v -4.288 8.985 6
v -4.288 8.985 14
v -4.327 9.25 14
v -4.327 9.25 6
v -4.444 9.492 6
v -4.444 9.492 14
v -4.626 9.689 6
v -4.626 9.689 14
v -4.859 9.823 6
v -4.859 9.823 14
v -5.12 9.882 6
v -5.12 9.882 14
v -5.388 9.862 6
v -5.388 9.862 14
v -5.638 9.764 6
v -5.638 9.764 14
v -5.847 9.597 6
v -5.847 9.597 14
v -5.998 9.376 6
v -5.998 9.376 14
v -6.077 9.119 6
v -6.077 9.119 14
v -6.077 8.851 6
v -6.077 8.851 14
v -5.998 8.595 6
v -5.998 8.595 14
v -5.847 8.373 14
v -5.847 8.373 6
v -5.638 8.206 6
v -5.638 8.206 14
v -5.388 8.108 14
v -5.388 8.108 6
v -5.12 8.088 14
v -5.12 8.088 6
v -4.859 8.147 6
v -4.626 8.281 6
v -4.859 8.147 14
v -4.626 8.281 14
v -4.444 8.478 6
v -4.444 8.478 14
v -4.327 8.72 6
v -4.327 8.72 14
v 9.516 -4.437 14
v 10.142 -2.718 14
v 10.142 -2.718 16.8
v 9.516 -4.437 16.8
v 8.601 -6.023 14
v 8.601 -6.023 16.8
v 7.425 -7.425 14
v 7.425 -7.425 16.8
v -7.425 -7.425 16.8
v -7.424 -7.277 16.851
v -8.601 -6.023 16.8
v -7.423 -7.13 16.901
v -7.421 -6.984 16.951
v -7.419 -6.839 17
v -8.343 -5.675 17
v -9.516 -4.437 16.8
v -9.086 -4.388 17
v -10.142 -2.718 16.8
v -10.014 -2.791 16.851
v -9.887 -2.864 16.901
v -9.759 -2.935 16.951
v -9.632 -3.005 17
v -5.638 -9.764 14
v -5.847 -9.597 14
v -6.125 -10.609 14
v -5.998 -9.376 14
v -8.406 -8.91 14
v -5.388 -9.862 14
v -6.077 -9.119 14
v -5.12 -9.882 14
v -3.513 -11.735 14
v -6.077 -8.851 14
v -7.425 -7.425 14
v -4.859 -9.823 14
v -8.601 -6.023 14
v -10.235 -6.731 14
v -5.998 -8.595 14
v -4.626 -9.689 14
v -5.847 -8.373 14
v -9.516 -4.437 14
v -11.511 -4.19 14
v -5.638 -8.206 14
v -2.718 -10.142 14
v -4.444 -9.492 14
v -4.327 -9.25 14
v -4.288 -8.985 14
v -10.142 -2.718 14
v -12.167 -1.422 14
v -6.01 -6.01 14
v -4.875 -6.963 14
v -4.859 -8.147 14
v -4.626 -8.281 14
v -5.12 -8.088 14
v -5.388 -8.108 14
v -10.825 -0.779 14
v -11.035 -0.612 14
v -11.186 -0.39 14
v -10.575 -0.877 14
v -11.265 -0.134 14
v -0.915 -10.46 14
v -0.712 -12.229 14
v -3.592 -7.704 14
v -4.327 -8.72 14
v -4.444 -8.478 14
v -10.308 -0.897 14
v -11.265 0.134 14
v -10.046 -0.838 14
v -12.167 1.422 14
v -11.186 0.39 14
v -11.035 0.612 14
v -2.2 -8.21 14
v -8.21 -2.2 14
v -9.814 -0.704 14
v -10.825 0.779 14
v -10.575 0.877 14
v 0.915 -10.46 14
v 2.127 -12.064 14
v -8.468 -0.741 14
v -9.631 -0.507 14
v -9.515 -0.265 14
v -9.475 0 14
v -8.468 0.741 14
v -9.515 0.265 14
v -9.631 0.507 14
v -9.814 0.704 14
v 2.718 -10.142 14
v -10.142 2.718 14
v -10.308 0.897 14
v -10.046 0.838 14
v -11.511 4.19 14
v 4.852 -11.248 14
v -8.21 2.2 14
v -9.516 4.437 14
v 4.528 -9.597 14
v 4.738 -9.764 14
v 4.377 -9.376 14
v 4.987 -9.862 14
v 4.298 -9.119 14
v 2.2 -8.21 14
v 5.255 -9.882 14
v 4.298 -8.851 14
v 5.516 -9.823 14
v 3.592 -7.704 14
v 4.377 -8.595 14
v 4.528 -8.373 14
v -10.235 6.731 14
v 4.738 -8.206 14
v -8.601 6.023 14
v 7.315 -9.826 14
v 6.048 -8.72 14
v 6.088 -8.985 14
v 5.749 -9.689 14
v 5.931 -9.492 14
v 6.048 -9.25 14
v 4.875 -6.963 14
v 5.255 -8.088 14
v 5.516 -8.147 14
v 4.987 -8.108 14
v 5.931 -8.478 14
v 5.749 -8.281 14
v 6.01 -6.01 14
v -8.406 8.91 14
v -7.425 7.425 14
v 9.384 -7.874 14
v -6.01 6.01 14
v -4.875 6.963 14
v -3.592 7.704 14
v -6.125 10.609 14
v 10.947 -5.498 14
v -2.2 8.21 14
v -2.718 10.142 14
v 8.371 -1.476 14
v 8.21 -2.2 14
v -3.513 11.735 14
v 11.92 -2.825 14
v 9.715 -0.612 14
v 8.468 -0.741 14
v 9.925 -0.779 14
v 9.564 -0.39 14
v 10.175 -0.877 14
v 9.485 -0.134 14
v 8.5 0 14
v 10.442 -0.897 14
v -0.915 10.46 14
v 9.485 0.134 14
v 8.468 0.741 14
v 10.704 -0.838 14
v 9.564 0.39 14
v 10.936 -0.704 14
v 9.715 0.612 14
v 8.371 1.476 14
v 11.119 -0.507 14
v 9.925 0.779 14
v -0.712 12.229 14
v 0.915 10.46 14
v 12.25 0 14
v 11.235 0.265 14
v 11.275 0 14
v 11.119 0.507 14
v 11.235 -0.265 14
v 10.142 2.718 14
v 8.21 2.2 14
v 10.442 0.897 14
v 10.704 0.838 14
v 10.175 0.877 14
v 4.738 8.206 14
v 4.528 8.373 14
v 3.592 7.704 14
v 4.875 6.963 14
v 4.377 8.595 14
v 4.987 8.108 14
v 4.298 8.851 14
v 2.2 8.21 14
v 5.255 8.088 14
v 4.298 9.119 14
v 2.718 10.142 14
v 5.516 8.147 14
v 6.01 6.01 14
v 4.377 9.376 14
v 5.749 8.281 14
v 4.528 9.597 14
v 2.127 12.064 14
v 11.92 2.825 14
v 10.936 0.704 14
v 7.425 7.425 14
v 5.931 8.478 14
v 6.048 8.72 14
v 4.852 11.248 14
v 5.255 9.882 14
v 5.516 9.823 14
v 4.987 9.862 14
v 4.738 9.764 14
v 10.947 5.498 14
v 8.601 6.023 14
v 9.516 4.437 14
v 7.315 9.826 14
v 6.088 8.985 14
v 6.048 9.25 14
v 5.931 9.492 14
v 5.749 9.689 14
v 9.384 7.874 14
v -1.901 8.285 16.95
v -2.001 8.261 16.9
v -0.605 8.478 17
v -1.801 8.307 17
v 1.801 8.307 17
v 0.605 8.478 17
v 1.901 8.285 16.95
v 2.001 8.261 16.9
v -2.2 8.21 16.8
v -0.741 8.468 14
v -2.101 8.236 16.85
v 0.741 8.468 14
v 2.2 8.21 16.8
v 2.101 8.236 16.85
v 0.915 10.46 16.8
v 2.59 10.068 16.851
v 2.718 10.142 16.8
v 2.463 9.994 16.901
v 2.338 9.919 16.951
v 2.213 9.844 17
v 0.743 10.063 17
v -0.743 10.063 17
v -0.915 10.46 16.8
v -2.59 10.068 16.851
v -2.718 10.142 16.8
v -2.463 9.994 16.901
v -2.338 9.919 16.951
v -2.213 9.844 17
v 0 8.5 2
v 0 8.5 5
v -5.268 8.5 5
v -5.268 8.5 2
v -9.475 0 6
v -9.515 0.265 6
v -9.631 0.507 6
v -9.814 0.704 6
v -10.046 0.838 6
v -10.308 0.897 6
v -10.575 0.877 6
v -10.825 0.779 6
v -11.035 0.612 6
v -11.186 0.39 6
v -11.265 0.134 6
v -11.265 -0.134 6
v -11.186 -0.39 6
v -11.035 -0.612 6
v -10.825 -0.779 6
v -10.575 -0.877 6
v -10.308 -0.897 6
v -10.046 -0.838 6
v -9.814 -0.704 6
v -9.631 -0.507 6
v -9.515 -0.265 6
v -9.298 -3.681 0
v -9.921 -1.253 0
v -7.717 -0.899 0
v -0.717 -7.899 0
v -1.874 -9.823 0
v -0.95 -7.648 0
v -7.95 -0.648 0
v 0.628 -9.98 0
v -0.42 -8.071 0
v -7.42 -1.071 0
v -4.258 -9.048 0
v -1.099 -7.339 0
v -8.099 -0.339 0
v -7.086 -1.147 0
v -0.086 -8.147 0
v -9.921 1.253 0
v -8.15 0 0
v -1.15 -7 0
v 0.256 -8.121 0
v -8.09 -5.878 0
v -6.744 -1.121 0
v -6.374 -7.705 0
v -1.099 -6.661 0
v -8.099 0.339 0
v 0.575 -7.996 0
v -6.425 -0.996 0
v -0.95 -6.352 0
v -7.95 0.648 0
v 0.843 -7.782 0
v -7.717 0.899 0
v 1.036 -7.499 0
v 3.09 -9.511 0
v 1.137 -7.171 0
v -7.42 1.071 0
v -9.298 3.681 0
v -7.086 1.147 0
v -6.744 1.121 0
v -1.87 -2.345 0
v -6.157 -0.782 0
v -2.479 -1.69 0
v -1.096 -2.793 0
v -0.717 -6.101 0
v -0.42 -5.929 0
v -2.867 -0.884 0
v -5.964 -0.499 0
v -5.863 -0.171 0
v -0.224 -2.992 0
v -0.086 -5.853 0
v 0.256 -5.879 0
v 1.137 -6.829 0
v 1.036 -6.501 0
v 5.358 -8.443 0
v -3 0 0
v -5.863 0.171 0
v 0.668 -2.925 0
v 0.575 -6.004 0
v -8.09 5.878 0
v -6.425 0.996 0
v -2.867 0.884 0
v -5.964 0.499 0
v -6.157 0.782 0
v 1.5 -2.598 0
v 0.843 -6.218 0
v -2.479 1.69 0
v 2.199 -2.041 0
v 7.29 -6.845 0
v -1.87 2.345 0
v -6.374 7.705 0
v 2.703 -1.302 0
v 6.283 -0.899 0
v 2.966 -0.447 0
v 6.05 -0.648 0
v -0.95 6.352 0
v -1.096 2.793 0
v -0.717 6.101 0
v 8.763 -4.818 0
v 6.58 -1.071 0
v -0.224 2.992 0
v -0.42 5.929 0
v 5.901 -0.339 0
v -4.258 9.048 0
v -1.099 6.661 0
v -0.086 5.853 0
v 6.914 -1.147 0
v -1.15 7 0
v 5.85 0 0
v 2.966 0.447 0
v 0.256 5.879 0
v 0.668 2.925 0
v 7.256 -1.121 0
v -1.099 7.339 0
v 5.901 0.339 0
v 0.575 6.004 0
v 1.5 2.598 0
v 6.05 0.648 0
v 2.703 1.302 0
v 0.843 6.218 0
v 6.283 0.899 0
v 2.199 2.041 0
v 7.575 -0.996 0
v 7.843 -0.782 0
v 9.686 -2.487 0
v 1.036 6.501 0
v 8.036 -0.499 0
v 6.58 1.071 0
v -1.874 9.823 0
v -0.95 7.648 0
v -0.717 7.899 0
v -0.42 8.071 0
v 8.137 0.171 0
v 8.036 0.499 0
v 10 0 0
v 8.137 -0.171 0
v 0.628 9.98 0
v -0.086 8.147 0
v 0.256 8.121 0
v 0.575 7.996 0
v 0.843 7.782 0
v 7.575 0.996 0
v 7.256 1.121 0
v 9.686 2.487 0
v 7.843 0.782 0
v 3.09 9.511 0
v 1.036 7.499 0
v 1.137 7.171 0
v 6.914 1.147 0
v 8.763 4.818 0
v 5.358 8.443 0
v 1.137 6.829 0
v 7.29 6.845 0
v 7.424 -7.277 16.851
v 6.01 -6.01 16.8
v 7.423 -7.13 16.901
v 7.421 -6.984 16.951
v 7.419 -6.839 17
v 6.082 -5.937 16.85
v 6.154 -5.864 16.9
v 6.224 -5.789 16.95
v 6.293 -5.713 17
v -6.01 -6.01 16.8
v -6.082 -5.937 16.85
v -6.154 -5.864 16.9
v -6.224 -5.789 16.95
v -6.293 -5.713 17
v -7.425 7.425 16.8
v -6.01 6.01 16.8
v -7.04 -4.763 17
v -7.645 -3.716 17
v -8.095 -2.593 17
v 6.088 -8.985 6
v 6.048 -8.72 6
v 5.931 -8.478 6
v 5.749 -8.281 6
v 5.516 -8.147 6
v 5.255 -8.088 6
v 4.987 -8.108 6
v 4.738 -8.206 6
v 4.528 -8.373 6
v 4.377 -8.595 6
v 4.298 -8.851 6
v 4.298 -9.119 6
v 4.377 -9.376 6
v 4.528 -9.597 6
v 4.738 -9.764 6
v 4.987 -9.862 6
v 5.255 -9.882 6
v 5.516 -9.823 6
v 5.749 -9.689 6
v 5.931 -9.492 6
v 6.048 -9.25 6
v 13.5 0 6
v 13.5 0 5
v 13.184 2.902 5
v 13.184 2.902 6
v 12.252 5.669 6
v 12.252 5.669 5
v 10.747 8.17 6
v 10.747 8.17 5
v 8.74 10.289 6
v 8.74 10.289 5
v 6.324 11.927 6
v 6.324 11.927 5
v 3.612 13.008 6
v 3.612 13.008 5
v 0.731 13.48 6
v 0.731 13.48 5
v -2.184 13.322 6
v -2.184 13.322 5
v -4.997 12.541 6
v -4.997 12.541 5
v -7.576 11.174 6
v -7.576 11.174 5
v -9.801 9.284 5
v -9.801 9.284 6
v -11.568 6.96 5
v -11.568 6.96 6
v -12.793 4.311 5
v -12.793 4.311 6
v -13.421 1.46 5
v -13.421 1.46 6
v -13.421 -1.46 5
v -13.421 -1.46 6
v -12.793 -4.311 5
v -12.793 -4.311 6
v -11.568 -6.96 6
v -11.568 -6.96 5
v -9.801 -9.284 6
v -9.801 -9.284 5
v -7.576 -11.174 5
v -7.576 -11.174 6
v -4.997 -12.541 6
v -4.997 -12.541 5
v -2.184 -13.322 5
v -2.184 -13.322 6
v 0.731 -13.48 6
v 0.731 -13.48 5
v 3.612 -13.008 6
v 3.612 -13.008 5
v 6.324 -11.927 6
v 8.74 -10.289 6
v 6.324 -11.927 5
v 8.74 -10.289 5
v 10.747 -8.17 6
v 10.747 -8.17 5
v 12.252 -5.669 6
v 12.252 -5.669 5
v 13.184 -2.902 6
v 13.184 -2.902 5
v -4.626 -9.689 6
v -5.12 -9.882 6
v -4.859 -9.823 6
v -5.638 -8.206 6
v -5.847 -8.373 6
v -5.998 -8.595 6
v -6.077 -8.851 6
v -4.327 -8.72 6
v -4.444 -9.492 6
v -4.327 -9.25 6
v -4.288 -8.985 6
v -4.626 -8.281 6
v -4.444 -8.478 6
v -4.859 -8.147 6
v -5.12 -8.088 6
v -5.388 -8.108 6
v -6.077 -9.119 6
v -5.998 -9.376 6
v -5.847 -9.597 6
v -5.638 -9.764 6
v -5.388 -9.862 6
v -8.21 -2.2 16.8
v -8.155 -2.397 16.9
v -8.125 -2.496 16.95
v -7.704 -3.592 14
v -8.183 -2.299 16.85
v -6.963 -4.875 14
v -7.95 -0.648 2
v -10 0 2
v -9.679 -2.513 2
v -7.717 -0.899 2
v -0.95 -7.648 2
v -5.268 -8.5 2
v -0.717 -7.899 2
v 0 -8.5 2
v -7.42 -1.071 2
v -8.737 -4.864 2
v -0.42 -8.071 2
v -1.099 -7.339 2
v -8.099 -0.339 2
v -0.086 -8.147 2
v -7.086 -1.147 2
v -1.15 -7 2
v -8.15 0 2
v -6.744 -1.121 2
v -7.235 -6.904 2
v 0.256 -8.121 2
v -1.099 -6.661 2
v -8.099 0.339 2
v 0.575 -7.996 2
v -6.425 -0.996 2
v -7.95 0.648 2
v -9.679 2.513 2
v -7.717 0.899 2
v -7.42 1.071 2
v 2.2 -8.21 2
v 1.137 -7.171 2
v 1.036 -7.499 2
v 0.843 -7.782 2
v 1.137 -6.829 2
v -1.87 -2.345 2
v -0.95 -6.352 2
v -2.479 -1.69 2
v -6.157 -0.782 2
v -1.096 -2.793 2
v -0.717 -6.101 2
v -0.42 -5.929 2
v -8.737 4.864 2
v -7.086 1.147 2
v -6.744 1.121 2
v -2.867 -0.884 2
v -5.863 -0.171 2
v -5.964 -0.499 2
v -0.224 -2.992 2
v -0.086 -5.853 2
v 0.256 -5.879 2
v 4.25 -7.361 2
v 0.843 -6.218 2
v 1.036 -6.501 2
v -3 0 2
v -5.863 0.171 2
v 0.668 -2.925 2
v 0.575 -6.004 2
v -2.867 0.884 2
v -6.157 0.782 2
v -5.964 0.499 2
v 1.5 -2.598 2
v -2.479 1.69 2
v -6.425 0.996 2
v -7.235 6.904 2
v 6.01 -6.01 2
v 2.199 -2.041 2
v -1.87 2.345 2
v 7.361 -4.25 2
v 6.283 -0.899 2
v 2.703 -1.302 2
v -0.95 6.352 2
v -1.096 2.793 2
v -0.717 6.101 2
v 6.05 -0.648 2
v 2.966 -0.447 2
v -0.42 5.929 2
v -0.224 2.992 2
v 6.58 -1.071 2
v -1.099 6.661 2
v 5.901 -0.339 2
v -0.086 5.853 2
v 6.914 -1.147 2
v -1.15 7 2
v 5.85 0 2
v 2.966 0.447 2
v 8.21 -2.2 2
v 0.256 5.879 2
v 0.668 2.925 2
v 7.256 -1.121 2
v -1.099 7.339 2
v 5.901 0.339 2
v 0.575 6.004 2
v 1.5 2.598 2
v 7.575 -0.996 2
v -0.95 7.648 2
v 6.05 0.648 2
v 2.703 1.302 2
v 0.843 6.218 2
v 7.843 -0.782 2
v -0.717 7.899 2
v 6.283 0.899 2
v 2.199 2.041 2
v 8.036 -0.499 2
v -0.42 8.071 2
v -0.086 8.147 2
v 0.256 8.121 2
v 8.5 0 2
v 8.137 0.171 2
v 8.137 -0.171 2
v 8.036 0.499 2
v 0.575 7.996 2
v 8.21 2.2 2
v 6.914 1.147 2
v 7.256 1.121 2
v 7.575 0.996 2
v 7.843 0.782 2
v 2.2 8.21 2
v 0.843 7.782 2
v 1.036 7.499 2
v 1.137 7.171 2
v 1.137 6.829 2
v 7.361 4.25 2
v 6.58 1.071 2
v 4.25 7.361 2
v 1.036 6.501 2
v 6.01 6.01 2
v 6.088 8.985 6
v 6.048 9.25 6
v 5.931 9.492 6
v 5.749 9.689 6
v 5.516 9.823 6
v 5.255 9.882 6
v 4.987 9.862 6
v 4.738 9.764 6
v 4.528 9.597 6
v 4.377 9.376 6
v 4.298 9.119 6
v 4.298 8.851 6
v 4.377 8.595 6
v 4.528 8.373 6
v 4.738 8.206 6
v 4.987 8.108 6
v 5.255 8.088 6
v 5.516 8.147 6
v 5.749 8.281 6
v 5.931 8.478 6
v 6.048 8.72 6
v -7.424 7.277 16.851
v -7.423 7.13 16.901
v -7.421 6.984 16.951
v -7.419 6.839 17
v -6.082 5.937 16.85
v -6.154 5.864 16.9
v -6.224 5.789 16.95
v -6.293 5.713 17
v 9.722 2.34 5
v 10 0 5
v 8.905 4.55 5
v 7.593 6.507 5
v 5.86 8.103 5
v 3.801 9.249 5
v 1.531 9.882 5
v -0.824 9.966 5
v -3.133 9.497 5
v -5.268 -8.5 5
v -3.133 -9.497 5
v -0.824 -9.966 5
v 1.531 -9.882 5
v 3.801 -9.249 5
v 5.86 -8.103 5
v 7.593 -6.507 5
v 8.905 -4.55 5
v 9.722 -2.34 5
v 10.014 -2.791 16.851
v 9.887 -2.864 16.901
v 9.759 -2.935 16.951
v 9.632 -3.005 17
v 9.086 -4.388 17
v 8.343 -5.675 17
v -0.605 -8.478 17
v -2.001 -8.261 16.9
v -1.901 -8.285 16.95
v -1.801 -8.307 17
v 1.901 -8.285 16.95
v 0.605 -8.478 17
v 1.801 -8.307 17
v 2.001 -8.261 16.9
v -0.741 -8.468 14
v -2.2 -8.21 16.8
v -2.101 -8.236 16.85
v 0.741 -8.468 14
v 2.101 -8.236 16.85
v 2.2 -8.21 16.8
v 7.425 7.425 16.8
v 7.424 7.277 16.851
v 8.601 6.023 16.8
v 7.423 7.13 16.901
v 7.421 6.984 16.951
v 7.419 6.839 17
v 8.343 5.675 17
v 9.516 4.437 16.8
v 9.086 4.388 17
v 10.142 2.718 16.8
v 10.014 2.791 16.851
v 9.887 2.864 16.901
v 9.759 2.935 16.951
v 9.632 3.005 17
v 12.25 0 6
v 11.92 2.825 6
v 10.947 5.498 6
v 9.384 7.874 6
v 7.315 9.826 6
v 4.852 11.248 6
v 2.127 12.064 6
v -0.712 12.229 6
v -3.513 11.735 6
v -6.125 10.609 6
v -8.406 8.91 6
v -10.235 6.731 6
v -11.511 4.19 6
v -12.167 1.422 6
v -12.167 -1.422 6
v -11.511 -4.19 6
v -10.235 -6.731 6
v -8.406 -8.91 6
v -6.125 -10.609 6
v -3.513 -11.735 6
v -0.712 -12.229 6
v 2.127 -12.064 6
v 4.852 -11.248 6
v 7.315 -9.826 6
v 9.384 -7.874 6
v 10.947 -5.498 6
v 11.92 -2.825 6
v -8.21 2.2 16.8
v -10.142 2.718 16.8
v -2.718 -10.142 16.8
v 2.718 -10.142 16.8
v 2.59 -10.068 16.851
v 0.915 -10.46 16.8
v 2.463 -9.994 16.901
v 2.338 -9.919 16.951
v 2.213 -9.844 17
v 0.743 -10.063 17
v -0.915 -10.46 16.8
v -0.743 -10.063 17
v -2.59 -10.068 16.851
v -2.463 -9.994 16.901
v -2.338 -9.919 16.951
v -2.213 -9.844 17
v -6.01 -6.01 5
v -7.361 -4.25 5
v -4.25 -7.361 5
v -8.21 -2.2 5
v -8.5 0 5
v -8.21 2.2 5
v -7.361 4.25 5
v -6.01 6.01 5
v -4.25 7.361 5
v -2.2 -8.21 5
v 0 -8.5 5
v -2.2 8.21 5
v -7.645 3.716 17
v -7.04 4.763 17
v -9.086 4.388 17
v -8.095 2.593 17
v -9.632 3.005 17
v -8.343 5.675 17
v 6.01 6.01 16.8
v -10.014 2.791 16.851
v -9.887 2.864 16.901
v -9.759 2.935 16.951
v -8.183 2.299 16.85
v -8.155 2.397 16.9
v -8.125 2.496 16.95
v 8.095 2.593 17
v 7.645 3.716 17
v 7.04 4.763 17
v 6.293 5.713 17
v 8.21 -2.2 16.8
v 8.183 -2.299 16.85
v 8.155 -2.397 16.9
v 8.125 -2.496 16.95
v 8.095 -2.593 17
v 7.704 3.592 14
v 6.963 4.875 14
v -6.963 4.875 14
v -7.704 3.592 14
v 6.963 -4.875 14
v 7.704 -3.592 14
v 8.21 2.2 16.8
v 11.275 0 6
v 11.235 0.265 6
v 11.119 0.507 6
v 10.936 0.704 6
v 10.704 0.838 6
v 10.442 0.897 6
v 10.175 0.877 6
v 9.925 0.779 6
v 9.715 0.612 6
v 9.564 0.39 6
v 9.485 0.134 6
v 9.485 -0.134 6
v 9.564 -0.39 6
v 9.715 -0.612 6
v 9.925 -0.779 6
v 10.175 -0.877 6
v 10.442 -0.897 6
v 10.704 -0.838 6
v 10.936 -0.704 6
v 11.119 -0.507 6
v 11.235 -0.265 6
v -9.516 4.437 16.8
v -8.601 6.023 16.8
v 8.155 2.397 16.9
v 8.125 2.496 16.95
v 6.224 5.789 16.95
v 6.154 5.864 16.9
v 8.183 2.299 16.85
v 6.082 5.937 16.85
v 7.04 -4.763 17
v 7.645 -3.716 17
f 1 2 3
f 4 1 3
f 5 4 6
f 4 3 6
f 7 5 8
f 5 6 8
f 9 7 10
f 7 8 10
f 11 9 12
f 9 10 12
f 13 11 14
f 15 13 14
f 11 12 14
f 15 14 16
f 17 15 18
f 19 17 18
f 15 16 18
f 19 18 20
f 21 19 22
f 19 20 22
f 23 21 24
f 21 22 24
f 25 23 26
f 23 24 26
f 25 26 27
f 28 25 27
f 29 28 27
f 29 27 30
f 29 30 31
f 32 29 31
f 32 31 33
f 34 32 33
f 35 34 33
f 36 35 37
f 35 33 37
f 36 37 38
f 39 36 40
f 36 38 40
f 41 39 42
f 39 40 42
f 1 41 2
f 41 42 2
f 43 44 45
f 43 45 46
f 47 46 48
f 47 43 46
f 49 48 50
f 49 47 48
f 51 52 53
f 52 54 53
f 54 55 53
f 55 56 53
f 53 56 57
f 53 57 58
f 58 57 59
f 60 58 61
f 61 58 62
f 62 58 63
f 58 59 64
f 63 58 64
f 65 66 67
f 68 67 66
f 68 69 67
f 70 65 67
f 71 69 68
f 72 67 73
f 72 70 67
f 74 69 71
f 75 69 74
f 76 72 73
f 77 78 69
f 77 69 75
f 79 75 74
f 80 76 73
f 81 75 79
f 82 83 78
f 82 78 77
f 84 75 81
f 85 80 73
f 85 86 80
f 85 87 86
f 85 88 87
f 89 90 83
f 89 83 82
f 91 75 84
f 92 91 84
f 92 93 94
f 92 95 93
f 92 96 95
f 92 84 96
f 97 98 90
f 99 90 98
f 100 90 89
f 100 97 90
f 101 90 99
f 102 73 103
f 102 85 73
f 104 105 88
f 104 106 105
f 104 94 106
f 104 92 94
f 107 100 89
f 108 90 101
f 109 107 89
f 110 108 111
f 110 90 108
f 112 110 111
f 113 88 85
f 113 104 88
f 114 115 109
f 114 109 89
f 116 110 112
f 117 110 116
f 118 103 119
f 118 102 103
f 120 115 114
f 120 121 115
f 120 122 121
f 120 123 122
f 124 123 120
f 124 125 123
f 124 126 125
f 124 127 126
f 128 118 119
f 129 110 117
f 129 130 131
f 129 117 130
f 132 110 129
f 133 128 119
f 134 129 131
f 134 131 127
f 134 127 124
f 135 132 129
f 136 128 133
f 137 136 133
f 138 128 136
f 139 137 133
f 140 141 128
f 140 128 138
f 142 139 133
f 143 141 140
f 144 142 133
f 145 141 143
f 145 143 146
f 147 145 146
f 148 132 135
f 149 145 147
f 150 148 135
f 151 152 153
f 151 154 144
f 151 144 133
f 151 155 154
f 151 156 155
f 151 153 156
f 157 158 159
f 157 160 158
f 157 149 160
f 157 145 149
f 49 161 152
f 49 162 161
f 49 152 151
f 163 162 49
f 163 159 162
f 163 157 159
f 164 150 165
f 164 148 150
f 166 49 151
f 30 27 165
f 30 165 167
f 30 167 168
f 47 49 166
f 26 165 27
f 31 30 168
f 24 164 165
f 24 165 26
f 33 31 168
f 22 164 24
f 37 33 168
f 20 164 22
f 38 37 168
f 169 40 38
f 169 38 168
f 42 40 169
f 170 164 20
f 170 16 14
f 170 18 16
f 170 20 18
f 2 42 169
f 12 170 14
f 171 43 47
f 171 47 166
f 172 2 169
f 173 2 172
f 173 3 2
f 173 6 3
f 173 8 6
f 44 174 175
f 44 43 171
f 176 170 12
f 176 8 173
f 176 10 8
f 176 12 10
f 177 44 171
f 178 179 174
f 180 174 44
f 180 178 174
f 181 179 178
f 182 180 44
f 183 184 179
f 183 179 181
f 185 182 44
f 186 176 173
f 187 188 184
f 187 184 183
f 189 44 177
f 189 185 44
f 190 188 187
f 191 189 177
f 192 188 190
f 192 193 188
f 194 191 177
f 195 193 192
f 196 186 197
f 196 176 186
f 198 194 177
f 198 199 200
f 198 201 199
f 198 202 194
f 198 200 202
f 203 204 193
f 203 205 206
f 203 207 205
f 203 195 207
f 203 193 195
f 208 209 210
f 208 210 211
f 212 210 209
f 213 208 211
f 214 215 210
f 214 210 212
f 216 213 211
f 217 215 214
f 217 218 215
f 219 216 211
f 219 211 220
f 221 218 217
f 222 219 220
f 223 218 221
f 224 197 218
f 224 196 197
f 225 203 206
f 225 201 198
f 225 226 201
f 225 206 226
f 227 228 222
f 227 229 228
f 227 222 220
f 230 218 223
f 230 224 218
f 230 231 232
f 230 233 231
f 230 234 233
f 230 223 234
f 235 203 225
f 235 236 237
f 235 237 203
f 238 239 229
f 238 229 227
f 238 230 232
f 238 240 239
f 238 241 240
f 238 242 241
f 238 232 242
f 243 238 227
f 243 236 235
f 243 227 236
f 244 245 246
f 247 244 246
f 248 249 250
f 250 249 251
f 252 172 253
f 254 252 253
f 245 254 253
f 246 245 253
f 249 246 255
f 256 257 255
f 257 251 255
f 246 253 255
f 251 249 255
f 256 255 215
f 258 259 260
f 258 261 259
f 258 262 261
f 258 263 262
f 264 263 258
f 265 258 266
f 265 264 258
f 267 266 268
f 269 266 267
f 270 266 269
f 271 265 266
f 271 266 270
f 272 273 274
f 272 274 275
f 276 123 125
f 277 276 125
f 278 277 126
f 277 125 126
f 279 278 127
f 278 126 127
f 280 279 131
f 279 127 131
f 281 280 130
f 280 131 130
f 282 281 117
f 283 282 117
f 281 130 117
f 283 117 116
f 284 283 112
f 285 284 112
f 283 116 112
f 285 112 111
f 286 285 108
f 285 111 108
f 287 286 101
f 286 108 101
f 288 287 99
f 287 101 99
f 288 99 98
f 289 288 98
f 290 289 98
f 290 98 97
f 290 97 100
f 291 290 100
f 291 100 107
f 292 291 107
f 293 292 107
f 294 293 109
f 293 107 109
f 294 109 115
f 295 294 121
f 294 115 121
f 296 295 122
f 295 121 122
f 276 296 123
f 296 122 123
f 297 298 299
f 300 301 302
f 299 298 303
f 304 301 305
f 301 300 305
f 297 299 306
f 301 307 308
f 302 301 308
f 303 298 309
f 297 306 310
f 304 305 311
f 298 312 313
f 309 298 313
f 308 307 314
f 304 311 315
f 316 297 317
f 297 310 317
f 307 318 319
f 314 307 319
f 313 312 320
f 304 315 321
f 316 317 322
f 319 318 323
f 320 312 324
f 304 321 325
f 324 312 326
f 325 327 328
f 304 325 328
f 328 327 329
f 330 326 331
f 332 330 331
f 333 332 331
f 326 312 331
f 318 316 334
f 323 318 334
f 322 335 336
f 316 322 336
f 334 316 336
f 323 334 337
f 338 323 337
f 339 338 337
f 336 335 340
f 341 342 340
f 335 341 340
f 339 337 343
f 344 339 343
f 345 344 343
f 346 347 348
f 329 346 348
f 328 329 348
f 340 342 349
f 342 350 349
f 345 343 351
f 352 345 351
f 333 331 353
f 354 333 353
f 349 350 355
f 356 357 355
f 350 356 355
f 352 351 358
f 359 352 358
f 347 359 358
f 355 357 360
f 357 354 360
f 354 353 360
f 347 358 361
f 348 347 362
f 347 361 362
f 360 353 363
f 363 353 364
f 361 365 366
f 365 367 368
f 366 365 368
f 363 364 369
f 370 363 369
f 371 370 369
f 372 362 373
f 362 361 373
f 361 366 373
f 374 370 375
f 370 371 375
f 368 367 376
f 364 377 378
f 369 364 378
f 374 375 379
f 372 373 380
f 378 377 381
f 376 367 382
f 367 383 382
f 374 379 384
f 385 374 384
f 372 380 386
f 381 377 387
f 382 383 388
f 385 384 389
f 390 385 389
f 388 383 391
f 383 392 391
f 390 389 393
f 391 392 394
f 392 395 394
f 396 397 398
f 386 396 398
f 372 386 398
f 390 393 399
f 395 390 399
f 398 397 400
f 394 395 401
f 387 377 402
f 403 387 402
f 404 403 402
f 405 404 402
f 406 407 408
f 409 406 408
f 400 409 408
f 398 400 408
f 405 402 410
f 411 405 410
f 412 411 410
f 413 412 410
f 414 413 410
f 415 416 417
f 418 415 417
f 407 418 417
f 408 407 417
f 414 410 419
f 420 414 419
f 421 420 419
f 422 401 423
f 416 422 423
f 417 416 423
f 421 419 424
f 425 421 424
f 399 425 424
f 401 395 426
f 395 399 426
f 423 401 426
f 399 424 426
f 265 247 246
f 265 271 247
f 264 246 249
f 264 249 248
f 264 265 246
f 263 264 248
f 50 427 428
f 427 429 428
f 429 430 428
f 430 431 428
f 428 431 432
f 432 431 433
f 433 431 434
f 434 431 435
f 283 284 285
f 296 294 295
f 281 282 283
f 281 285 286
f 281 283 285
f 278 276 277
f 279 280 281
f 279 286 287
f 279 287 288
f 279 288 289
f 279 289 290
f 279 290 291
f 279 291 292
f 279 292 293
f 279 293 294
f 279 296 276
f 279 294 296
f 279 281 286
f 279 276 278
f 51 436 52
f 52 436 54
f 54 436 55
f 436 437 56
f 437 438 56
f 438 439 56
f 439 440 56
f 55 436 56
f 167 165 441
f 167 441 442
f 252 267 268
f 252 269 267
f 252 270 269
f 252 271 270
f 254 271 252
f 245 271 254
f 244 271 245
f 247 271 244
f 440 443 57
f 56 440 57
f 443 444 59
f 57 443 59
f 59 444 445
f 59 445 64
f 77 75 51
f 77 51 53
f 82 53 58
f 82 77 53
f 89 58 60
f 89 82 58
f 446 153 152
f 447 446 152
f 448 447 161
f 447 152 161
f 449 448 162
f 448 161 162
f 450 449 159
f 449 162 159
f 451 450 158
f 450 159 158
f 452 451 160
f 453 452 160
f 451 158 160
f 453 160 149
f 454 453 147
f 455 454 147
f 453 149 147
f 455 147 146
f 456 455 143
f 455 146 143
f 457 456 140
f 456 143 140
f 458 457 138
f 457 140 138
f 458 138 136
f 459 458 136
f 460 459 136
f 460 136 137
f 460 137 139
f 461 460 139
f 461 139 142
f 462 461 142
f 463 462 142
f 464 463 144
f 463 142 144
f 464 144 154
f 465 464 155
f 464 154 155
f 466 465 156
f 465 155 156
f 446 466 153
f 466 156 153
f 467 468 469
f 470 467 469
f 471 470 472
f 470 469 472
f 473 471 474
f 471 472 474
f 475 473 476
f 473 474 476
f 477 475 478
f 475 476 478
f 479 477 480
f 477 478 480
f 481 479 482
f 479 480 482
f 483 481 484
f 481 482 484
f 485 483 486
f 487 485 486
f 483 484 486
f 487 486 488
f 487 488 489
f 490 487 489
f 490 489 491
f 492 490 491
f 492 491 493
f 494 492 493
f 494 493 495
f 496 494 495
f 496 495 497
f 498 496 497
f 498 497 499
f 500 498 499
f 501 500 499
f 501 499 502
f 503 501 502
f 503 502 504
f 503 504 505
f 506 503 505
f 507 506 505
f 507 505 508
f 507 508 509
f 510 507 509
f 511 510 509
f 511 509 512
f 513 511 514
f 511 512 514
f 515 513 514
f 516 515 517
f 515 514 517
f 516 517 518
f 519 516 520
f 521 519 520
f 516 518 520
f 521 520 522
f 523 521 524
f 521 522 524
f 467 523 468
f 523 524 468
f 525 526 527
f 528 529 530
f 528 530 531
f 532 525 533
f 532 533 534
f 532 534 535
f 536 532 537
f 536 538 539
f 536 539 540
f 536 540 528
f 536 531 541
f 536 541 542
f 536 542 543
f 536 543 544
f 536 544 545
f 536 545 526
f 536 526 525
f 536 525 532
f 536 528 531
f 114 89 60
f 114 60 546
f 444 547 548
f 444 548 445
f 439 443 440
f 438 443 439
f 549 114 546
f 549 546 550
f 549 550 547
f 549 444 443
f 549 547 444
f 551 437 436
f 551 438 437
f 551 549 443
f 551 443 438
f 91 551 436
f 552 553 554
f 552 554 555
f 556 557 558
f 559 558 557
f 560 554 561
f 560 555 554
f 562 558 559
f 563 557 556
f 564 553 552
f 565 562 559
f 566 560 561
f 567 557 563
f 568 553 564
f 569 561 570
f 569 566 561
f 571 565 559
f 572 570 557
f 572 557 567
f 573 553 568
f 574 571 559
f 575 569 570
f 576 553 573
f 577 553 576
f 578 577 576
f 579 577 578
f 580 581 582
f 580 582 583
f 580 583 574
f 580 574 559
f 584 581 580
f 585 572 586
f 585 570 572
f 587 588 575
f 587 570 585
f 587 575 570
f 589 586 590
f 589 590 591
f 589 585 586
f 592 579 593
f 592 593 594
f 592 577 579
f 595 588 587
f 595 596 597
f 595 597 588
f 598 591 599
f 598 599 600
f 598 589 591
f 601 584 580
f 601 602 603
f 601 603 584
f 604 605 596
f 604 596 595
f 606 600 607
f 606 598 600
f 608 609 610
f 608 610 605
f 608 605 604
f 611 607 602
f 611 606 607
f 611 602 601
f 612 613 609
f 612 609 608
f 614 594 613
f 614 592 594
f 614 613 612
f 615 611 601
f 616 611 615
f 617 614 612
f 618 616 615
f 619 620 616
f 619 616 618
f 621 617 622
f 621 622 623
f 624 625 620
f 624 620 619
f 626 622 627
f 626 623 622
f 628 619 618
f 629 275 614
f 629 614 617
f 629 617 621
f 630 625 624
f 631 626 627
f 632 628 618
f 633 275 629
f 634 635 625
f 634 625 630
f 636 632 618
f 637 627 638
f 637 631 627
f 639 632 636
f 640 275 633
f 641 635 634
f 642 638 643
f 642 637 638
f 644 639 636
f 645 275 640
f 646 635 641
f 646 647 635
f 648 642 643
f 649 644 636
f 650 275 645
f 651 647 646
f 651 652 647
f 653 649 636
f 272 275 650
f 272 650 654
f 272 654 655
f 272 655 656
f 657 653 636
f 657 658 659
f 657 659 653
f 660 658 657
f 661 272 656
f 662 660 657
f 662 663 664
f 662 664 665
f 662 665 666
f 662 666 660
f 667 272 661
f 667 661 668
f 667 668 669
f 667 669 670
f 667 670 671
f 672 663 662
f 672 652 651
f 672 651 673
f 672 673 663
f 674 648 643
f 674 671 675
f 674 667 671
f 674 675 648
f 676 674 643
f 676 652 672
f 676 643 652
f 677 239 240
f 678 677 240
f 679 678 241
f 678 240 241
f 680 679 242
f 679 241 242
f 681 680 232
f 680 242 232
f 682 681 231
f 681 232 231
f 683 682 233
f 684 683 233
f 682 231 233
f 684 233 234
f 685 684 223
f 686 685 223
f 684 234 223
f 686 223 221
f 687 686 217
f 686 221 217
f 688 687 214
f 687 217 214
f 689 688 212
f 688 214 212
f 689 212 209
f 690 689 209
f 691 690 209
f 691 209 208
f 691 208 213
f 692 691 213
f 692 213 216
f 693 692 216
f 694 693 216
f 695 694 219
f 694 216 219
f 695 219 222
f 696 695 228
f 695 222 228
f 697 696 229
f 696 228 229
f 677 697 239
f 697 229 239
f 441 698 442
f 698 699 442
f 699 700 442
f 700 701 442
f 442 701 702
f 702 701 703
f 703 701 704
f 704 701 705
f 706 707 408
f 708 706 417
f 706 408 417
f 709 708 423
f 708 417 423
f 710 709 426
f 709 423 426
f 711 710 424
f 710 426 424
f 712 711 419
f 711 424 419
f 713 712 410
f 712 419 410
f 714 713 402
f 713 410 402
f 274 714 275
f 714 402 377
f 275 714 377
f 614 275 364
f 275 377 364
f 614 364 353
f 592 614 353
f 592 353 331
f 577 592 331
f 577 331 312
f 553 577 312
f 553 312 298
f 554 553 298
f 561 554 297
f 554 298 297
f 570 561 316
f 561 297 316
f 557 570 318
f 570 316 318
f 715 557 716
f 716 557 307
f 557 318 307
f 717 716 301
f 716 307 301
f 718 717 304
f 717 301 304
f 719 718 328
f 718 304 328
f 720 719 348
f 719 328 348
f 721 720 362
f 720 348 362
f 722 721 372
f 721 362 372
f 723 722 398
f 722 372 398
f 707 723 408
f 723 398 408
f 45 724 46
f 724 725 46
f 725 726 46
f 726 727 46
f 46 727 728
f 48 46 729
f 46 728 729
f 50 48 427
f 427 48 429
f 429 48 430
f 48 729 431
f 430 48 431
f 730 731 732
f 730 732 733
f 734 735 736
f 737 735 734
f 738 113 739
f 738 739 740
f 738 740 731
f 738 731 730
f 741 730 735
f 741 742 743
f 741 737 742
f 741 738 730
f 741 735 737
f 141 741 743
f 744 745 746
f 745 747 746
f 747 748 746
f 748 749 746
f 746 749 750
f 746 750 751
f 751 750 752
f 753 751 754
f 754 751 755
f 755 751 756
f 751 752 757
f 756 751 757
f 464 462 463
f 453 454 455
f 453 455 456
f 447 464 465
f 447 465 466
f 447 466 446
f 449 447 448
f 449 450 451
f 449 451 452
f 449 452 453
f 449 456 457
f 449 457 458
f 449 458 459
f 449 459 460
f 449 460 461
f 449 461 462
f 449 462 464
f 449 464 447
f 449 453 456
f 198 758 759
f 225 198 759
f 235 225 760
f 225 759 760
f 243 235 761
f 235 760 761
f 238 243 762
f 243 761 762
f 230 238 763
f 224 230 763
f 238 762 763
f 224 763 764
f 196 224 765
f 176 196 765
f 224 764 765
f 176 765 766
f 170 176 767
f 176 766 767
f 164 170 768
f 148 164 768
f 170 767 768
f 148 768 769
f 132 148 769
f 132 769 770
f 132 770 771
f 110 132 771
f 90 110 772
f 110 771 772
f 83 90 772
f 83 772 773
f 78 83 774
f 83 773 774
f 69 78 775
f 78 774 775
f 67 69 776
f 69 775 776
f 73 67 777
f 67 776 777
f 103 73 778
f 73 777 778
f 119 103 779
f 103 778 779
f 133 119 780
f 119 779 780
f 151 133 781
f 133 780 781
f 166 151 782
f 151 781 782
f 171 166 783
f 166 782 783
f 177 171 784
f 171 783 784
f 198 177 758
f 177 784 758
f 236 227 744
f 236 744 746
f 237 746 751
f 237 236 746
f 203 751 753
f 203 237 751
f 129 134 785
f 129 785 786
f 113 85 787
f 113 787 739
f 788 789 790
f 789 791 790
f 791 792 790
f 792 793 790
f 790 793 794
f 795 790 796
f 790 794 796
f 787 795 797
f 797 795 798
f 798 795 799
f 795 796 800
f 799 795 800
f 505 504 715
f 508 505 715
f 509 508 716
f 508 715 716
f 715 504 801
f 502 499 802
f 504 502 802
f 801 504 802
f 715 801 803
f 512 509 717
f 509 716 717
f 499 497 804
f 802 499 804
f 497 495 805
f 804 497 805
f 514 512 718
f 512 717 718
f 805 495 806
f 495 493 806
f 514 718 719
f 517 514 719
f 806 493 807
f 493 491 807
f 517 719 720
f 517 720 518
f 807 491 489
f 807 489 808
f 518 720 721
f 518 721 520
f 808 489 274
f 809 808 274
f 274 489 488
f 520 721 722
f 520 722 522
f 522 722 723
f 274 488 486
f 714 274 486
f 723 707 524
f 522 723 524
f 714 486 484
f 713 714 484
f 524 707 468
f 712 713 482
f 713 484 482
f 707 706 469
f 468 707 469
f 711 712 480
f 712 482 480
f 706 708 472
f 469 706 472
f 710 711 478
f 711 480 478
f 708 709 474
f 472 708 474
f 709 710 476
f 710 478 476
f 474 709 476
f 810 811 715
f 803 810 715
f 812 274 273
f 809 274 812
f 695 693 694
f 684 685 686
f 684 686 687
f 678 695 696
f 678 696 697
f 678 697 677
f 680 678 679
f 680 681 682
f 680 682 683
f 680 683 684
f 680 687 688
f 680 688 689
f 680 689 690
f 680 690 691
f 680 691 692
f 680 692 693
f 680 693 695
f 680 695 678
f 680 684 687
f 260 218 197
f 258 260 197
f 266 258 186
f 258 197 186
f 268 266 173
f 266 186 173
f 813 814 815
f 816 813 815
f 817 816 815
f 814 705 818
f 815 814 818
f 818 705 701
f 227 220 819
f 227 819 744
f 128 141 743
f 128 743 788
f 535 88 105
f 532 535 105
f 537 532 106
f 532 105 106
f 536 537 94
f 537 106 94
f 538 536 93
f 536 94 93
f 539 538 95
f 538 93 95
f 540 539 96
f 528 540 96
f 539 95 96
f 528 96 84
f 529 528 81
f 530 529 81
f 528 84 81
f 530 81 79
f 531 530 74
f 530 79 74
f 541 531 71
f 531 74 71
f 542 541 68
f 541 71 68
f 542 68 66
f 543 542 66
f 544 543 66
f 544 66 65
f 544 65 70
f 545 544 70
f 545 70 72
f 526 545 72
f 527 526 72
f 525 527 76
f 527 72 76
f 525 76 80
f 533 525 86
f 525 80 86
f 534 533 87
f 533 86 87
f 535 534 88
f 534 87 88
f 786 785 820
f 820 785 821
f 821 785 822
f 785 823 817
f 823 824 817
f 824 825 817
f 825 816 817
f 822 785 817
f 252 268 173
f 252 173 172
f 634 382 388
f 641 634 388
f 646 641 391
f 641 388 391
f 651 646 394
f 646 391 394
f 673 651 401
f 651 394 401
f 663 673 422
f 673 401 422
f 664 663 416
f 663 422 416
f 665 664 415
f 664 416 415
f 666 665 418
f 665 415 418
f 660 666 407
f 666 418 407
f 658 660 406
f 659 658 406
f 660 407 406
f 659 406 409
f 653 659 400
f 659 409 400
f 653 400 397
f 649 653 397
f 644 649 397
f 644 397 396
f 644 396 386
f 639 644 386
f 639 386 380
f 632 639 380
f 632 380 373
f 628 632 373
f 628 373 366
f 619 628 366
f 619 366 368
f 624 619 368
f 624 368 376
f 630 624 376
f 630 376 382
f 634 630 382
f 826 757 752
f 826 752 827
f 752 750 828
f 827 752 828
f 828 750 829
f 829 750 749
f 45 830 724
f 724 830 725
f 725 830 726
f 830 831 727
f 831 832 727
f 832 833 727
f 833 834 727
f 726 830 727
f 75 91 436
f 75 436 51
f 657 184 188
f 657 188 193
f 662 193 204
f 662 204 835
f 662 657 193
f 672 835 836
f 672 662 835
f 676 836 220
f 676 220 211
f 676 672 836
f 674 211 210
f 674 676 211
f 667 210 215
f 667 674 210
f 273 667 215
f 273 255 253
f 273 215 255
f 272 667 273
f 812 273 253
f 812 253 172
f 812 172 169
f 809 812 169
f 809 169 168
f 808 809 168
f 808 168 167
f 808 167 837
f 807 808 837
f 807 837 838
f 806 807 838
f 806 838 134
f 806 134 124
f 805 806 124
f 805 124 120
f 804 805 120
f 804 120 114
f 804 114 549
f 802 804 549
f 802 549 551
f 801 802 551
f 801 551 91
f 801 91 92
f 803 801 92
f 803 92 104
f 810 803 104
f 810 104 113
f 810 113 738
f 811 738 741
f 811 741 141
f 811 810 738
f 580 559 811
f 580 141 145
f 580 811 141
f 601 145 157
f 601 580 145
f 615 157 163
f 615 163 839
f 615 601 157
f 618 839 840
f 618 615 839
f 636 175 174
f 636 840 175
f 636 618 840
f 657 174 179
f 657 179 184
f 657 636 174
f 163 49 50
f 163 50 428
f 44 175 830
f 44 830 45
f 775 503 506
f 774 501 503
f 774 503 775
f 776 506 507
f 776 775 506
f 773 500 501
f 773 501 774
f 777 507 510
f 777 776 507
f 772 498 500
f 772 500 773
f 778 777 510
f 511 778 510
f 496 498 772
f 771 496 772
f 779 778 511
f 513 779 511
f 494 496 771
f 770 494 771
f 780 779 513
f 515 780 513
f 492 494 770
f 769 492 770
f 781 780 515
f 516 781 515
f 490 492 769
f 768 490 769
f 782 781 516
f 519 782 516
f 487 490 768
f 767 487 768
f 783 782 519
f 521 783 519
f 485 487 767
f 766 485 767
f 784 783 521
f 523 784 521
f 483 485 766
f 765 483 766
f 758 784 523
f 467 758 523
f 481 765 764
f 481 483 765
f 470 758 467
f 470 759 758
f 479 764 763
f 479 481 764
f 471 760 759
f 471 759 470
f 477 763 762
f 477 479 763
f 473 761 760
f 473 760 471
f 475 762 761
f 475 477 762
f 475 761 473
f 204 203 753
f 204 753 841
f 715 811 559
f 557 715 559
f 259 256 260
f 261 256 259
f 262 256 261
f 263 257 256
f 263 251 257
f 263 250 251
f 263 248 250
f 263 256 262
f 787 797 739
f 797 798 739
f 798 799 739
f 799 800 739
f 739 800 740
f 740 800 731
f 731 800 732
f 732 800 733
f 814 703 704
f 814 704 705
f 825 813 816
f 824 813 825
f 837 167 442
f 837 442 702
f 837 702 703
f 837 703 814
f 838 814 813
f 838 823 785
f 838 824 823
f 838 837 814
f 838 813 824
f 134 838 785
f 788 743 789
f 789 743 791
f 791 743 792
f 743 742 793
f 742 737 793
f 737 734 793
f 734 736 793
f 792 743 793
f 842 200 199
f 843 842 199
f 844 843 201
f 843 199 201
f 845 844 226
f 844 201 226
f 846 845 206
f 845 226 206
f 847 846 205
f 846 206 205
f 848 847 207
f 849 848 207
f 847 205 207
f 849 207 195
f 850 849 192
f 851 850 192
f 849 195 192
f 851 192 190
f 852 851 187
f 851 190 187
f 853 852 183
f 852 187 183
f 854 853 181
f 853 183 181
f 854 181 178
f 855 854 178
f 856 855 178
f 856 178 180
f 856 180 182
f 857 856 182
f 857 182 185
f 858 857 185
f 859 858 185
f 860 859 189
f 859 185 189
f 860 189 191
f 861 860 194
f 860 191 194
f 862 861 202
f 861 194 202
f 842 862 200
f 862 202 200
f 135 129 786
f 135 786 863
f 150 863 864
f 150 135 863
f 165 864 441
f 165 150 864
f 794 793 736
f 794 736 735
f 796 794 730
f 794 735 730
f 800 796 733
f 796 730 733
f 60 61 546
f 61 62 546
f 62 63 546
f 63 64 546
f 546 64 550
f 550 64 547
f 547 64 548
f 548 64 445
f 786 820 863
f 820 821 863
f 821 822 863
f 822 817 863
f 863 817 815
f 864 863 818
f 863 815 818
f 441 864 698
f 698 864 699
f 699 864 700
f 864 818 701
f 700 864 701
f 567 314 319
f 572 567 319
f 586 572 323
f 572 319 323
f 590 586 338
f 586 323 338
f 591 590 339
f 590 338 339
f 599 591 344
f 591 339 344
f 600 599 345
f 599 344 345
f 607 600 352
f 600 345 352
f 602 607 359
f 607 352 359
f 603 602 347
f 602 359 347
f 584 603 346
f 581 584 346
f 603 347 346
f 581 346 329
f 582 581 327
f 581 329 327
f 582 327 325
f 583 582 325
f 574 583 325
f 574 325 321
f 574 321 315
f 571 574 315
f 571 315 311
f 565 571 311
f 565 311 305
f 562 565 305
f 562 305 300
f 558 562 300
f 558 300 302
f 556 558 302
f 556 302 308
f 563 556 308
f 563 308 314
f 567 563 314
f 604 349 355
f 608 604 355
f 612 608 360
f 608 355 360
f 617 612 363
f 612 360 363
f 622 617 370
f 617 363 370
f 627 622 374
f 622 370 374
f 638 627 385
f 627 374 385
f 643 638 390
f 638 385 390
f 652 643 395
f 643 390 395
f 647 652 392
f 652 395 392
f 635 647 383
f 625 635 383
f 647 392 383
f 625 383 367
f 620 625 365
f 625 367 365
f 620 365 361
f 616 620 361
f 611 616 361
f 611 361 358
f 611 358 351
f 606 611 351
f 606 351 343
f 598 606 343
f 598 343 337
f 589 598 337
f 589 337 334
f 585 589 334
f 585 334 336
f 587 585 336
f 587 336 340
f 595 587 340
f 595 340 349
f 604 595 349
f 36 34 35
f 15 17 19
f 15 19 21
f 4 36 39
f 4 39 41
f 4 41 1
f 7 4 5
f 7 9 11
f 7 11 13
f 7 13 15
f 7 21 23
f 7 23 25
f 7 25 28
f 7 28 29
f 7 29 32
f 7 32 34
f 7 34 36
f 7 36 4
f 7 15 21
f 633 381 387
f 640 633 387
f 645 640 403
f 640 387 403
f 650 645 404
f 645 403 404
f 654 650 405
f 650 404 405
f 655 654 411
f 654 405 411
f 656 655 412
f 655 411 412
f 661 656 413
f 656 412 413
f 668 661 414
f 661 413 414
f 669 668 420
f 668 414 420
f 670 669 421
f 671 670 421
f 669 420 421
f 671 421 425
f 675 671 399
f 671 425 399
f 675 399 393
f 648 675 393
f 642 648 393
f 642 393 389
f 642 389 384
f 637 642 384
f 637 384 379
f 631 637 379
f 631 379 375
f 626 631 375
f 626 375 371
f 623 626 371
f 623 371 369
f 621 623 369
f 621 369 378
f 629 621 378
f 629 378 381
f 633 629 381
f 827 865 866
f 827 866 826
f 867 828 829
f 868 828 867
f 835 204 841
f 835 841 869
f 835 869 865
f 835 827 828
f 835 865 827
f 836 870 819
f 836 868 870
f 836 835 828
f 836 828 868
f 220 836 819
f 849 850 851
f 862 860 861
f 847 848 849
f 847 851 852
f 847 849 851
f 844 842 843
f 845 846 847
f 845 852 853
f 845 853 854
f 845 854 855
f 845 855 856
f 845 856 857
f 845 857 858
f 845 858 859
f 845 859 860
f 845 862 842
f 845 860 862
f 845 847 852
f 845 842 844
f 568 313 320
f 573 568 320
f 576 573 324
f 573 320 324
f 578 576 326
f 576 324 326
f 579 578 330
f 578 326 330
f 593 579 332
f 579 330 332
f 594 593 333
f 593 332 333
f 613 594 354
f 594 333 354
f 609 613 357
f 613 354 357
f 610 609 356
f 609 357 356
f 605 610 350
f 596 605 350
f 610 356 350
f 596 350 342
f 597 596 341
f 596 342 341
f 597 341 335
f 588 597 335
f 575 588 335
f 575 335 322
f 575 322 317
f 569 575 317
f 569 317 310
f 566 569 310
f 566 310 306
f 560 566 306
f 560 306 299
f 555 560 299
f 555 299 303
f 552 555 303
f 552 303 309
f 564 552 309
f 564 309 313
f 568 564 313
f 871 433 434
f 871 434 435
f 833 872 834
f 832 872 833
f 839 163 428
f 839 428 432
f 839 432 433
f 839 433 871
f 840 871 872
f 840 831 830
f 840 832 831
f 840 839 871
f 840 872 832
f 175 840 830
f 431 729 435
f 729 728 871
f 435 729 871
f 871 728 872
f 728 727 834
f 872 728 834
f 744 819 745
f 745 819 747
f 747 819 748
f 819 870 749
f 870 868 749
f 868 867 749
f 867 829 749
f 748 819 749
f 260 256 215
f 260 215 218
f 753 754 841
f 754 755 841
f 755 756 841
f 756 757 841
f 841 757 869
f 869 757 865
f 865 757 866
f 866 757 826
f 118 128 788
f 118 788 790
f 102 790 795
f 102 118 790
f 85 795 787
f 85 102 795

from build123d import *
from OCP.BRepFilletAPI import BRepFilletAPI_MakeChamfer

# Parameters (mm, degrees)
SKETCH_1_R          = 10
EXTRUDE_1_DEPTH     = 2
SKETCH_2_R          = 10
SKETCH_2_R_2        = 8.5
EXTRUDE_2_DEPTH     = 3
SKETCH_4_R          = 13.5
SKETCH_4_R_2        = 8.5
EXTRUDE_3_DEPTH     = 1
SKETCH_5_R          = 12.25
SKETCH_5_R_2        = 8.5
EXTRUDE_4_DEPTH     = 8
SKETCH_6_R          = 0.9
CUT_EXTRUDE_1_DEPTH = 8
SKETCH_7_R          = 3
SKETCH_7_R_2        = 1.15
CUT_EXTRUDE_2_DEPTH = 24.674881204
SKETCH_9_W          = 3
SKETCH_9_H          = 17
CUT_EXTRUDE_4_DEPTH = 24.674881204
EXTRUDE_5_DEPTH     = 3
CHAMFER_1_SIZE      = 0.2
CHAMFER_1_SIZE2     = 0.410060768


with BuildPart() as part:
    # 스케치1 → 보스-돌출1 (new body)
    with BuildSketch(Plane.XY):
        Circle(SKETCH_1_R)
    extrude(amount=EXTRUDE_1_DEPTH)

    # 스케치2 → 보스-돌출2 (add)
    with BuildSketch(Plane.XY.offset(2)):
        Circle(SKETCH_2_R)
        Circle(SKETCH_2_R_2, mode=Mode.SUBTRACT)
    extrude(amount=EXTRUDE_2_DEPTH)

    # 스케치4 → 보스-돌출3 (add)
    with BuildSketch(Plane.XY.offset(5)):
        Circle(SKETCH_4_R)
        Circle(SKETCH_4_R_2, mode=Mode.SUBTRACT)
    extrude(amount=EXTRUDE_3_DEPTH)

    # 스케치5 → 보스-돌출4 (add)
    with BuildSketch(Plane.XY.offset(6)):
        Circle(SKETCH_5_R)
        Circle(SKETCH_5_R_2, mode=Mode.SUBTRACT)
    extrude(amount=EXTRUDE_4_DEPTH)

    # 스케치6 → 컷-돌출1 (cut)
    with BuildSketch(Plane.XY.offset(14)):
        with Locations((10.375, 0)):
            Circle(SKETCH_6_R)
        with Locations((5.1875, -8.985013564)):
            Circle(SKETCH_6_R)
        with Locations((-5.1875, -8.985013564)):
            Circle(SKETCH_6_R)
        with Locations((-10.375, 0)):
            Circle(SKETCH_6_R)
        with Locations((-5.1875, 8.985013564)):
            Circle(SKETCH_6_R)
        with Locations((5.1875, 8.985013564)):
            Circle(SKETCH_6_R)
    extrude(amount=-CUT_EXTRUDE_1_DEPTH, mode=Mode.SUBTRACT)

    # 스케치7 → 컷-돌출2 (cut, through all)
    with BuildSketch(Plane(origin=(0, 0, 0), x_dir=(-1, 0, 0), z_dir=(0, 0, -1))):
        Circle(SKETCH_7_R)
        with Locations((-7, 0)):
            Circle(SKETCH_7_R_2)
        with Locations((7, 0)):
            Circle(SKETCH_7_R_2)
        with Locations((0, 7)):
            Circle(SKETCH_7_R_2)
        with Locations((0, -7)):
            Circle(SKETCH_7_R_2)
    extrude(amount=-CUT_EXTRUDE_2_DEPTH, mode=Mode.SUBTRACT)

    # 스케치9 → 컷-돌출4 (cut, through all)
    with BuildSketch(Plane(origin=(0, 0, 0), x_dir=(0, 0, -1), z_dir=(1, 0, 0))):
        with Locations((-3.5, 0)):
            Rectangle(SKETCH_9_W, SKETCH_9_H)
    extrude(amount=-CUT_EXTRUDE_4_DEPTH, mode=Mode.SUBTRACT)

    # 스케치10 → 보스-돌출5 (add)
    with BuildSketch(Plane.XY.offset(14)):
        with BuildLine():
            Line((2.199961883, 8.210369523), (2.717599974, 10.142221176))
            ThreePointArc((2.717599974, 10.142221176), (0, 10.5), (-2.717599974, 10.142221176))
            Line((-2.717599974, 10.142221176), (-2.199961883, 8.210369523))
            ThreePointArc((-2.199961883, 8.210369523), (0, 8.5), (2.199961883, 8.210369523))
        make_face()
        with BuildLine():
            Line((6.01040764, 6.01040764), (7.424621202, 7.424621202))
            ThreePointArc((7.424621202, 7.424621202), (9.09326674, 5.25), (10.142221176, 2.717599974))
            Line((10.142221176, 2.717599974), (8.210369523, 2.199961883))
            ThreePointArc((8.210369523, 2.199961883), (7.361215932, 4.25), (6.01040764, 6.01040764))
        make_face()
        with BuildLine():
            Line((8.210369523, -2.199961883), (10.142221176, -2.717599974))
            ThreePointArc((10.142221176, -2.717599974), (9.09326674, -5.25), (7.424621202, -7.424621202))
            Line((7.424621202, -7.424621202), (6.01040764, -6.01040764))
            ThreePointArc((6.01040764, -6.01040764), (7.361215932, -4.25), (8.210369523, -2.199961883))
        make_face()
        with BuildLine():
            Line((2.199961883, -8.210369523), (2.717599974, -10.142221176))
            ThreePointArc((2.717599974, -10.142221176), (0, -10.5), (-2.717599974, -10.142221176))
            Line((-2.717599974, -10.142221176), (-2.199961883, -8.210369523))
            ThreePointArc((-2.199961883, -8.210369523), (0, -8.5), (2.199961883, -8.210369523))
        make_face()
        with BuildLine():
            Line((-6.01040764, -6.01040764), (-7.424621202, -7.424621202))
            ThreePointArc((-7.424621202, -7.424621202), (-9.09326674, -5.25), (-10.142221176, -2.717599974))
            Line((-10.142221176, -2.717599974), (-8.210369523, -2.199961883))
            ThreePointArc((-8.210369523, -2.199961883), (-7.361215932, -4.25), (-6.01040764, -6.01040764))
        make_face()
        with BuildLine():
            Line((-8.210369523, 2.199961883), (-10.142221176, 2.717599974))
            ThreePointArc((-10.142221176, 2.717599974), (-9.09326674, 5.25), (-7.424621202, 7.424621202))
            Line((-7.424621202, 7.424621202), (-6.01040764, 6.01040764))
            ThreePointArc((-6.01040764, 6.01040764), (-7.361215932, 4.25), (-8.210369523, 2.199961883))
        make_face()
    extrude(amount=EXTRUDE_5_DEPTH)

    # 모따기1: one chamfer whose edges measure the first distance from different faces: ONE call of the kernel's chamfer builder (chamfer() names one face for all edges)
    chamfer_1_edges_1 = [part.edges().sort_by_distance(p)[0] for p in [
        (-6.717514421, 6.717514421, 17),
    ]]
    chamfer_1_side_1 = [part.faces().sort_by_distance(p)[0] for p in [
        (-6.717514421, 6.717514421, 15.5),
    ]]
    chamfer_1_edges_2 = [part.edges().sort_by_distance(p)[0] for p in [
        (-9.09326674, 5.25, 17),
    ]]
    chamfer_1_side_2 = [part.faces().sort_by_distance(p)[0] for p in [
        (-9.09326674, 5.25, 15.5),
    ]]
    chamfer_1_edges_3 = [part.edges().sort_by_distance(p)[0] for p in [
        (-9.17629535, 2.458780928, 17),
    ]]
    chamfer_1_side_3 = [part.faces().sort_by_distance(p)[0] for p in [
        (-9.17629535, 2.458780928, 15.5),
    ]]
    chamfer_1_edges_4 = [part.edges().sort_by_distance(p)[0] for p in [
        (-9.17629535, -2.458780928, 17),
    ]]
    chamfer_1_side_4 = [part.faces().sort_by_distance(p)[0] for p in [
        (-9.17629535, -2.458780928, 15.5),
    ]]
    chamfer_1_edges_5 = [part.edges().sort_by_distance(p)[0] for p in [
        (-9.09326674, -5.25, 17),
    ]]
    chamfer_1_side_5 = [part.faces().sort_by_distance(p)[0] for p in [
        (-9.09326674, -5.25, 15.5),
    ]]
    chamfer_1_edges_6 = [part.edges().sort_by_distance(p)[0] for p in [
        (-6.717514421, -6.717514421, 17),
    ]]
    chamfer_1_side_6 = [part.faces().sort_by_distance(p)[0] for p in [
        (-6.717514421, -6.717514421, 15.5),
    ]]
    chamfer_1_edges_7 = [part.edges().sort_by_distance(p)[0] for p in [
        (0, 10.5, 17),
    ]]
    chamfer_1_side_7 = [part.faces().sort_by_distance(p)[0] for p in [
        (0, 10.5, 15.5),
    ]]
    chamfer_1_edges_8 = [part.edges().sort_by_distance(p)[0] for p in [
        (-2.458780928, 9.17629535, 17),
    ]]
    chamfer_1_side_8 = [part.faces().sort_by_distance(p)[0] for p in [
        (-2.458780928, 9.17629535, 15.5),
    ]]
    chamfer_1_edges_9 = [part.edges().sort_by_distance(p)[0] for p in [
        (2.458780928, 9.17629535, 17),
    ]]
    chamfer_1_side_9 = [part.faces().sort_by_distance(p)[0] for p in [
        (2.458780928, 9.17629535, 15.5),
    ]]
    chamfer_1_edges_10 = [part.edges().sort_by_distance(p)[0] for p in [
        (-2.458780928, -9.17629535, 17),
    ]]
    chamfer_1_side_10 = [part.faces().sort_by_distance(p)[0] for p in [
        (-2.458780928, -9.17629535, 15.5),
    ]]
    chamfer_1_edges_11 = [part.edges().sort_by_distance(p)[0] for p in [
        (0, -10.5, 17),
    ]]
    chamfer_1_side_11 = [part.faces().sort_by_distance(p)[0] for p in [
        (0, -10.5, 15.5),
    ]]
    chamfer_1_edges_12 = [part.edges().sort_by_distance(p)[0] for p in [
        (2.458780928, -9.17629535, 17),
    ]]
    chamfer_1_side_12 = [part.faces().sort_by_distance(p)[0] for p in [
        (2.458780928, -9.17629535, 15.5),
    ]]
    chamfer_1_edges_13 = [part.edges().sort_by_distance(p)[0] for p in [
        (9.09326674, 5.25, 17),
    ]]
    chamfer_1_side_13 = [part.faces().sort_by_distance(p)[0] for p in [
        (9.09326674, 5.25, 15.5),
    ]]
    chamfer_1_edges_14 = [part.edges().sort_by_distance(p)[0] for p in [
        (6.717514421, 6.717514421, 17),
    ]]
    chamfer_1_side_14 = [part.faces().sort_by_distance(p)[0] for p in [
        (6.717514421, 6.717514421, 15.5),
    ]]
    chamfer_1_edges_15 = [part.edges().sort_by_distance(p)[0] for p in [
        (9.17629535, 2.458780928, 17),
    ]]
    chamfer_1_side_15 = [part.faces().sort_by_distance(p)[0] for p in [
        (9.17629535, 2.458780928, 15.5),
    ]]
    chamfer_1_edges_16 = [part.edges().sort_by_distance(p)[0] for p in [
        (6.717514421, -6.717514421, 17),
    ]]
    chamfer_1_side_16 = [part.faces().sort_by_distance(p)[0] for p in [
        (6.717514421, -6.717514421, 15.5),
    ]]
    chamfer_1_edges_17 = [part.edges().sort_by_distance(p)[0] for p in [
        (9.09326674, -5.25, 17),
    ]]
    chamfer_1_side_17 = [part.faces().sort_by_distance(p)[0] for p in [
        (9.09326674, -5.25, 15.5),
    ]]
    chamfer_1_edges_18 = [part.edges().sort_by_distance(p)[0] for p in [
        (9.17629535, -2.458780928, 17),
    ]]
    chamfer_1_side_18 = [part.faces().sort_by_distance(p)[0] for p in [
        (9.17629535, -2.458780928, 15.5),
    ]]
    chamfer_1 = BRepFilletAPI_MakeChamfer(part.part.solid().wrapped)
    for e in chamfer_1_edges_1:
        chamfer_1.Add(CHAMFER_1_SIZE, CHAMFER_1_SIZE2, e.wrapped, chamfer_1_side_1[0].wrapped)  # the first distance lies on this face
    for e in chamfer_1_edges_2:
        chamfer_1.Add(CHAMFER_1_SIZE, CHAMFER_1_SIZE2, e.wrapped, chamfer_1_side_2[0].wrapped)  # the first distance lies on this face
    for e in chamfer_1_edges_3:
        chamfer_1.Add(CHAMFER_1_SIZE, CHAMFER_1_SIZE2, e.wrapped, chamfer_1_side_3[0].wrapped)  # the first distance lies on this face
    for e in chamfer_1_edges_4:
        chamfer_1.Add(CHAMFER_1_SIZE, CHAMFER_1_SIZE2, e.wrapped, chamfer_1_side_4[0].wrapped)  # the first distance lies on this face
    for e in chamfer_1_edges_5:
        chamfer_1.Add(CHAMFER_1_SIZE, CHAMFER_1_SIZE2, e.wrapped, chamfer_1_side_5[0].wrapped)  # the first distance lies on this face
    for e in chamfer_1_edges_6:
        chamfer_1.Add(CHAMFER_1_SIZE, CHAMFER_1_SIZE2, e.wrapped, chamfer_1_side_6[0].wrapped)  # the first distance lies on this face
    for e in chamfer_1_edges_7:
        chamfer_1.Add(CHAMFER_1_SIZE, CHAMFER_1_SIZE2, e.wrapped, chamfer_1_side_7[0].wrapped)  # the first distance lies on this face
    for e in chamfer_1_edges_8:
        chamfer_1.Add(CHAMFER_1_SIZE, CHAMFER_1_SIZE2, e.wrapped, chamfer_1_side_8[0].wrapped)  # the first distance lies on this face
    for e in chamfer_1_edges_9:
        chamfer_1.Add(CHAMFER_1_SIZE, CHAMFER_1_SIZE2, e.wrapped, chamfer_1_side_9[0].wrapped)  # the first distance lies on this face
    for e in chamfer_1_edges_10:
        chamfer_1.Add(CHAMFER_1_SIZE, CHAMFER_1_SIZE2, e.wrapped, chamfer_1_side_10[0].wrapped)  # the first distance lies on this face
    for e in chamfer_1_edges_11:
        chamfer_1.Add(CHAMFER_1_SIZE, CHAMFER_1_SIZE2, e.wrapped, chamfer_1_side_11[0].wrapped)  # the first distance lies on this face
    for e in chamfer_1_edges_12:
        chamfer_1.Add(CHAMFER_1_SIZE, CHAMFER_1_SIZE2, e.wrapped, chamfer_1_side_12[0].wrapped)  # the first distance lies on this face
    for e in chamfer_1_edges_13:
        chamfer_1.Add(CHAMFER_1_SIZE, CHAMFER_1_SIZE2, e.wrapped, chamfer_1_side_13[0].wrapped)  # the first distance lies on this face
    for e in chamfer_1_edges_14:
        chamfer_1.Add(CHAMFER_1_SIZE, CHAMFER_1_SIZE2, e.wrapped, chamfer_1_side_14[0].wrapped)  # the first distance lies on this face
    for e in chamfer_1_edges_15:
        chamfer_1.Add(CHAMFER_1_SIZE, CHAMFER_1_SIZE2, e.wrapped, chamfer_1_side_15[0].wrapped)  # the first distance lies on this face
    for e in chamfer_1_edges_16:
        chamfer_1.Add(CHAMFER_1_SIZE, CHAMFER_1_SIZE2, e.wrapped, chamfer_1_side_16[0].wrapped)  # the first distance lies on this face
    for e in chamfer_1_edges_17:
        chamfer_1.Add(CHAMFER_1_SIZE, CHAMFER_1_SIZE2, e.wrapped, chamfer_1_side_17[0].wrapped)  # the first distance lies on this face
    for e in chamfer_1_edges_18:
        chamfer_1.Add(CHAMFER_1_SIZE, CHAMFER_1_SIZE2, e.wrapped, chamfer_1_side_18[0].wrapped)  # the first distance lies on this face
    add(Compound.cast(chamfer_1.Shape()), mode=Mode.REPLACE)


solid = part.part
